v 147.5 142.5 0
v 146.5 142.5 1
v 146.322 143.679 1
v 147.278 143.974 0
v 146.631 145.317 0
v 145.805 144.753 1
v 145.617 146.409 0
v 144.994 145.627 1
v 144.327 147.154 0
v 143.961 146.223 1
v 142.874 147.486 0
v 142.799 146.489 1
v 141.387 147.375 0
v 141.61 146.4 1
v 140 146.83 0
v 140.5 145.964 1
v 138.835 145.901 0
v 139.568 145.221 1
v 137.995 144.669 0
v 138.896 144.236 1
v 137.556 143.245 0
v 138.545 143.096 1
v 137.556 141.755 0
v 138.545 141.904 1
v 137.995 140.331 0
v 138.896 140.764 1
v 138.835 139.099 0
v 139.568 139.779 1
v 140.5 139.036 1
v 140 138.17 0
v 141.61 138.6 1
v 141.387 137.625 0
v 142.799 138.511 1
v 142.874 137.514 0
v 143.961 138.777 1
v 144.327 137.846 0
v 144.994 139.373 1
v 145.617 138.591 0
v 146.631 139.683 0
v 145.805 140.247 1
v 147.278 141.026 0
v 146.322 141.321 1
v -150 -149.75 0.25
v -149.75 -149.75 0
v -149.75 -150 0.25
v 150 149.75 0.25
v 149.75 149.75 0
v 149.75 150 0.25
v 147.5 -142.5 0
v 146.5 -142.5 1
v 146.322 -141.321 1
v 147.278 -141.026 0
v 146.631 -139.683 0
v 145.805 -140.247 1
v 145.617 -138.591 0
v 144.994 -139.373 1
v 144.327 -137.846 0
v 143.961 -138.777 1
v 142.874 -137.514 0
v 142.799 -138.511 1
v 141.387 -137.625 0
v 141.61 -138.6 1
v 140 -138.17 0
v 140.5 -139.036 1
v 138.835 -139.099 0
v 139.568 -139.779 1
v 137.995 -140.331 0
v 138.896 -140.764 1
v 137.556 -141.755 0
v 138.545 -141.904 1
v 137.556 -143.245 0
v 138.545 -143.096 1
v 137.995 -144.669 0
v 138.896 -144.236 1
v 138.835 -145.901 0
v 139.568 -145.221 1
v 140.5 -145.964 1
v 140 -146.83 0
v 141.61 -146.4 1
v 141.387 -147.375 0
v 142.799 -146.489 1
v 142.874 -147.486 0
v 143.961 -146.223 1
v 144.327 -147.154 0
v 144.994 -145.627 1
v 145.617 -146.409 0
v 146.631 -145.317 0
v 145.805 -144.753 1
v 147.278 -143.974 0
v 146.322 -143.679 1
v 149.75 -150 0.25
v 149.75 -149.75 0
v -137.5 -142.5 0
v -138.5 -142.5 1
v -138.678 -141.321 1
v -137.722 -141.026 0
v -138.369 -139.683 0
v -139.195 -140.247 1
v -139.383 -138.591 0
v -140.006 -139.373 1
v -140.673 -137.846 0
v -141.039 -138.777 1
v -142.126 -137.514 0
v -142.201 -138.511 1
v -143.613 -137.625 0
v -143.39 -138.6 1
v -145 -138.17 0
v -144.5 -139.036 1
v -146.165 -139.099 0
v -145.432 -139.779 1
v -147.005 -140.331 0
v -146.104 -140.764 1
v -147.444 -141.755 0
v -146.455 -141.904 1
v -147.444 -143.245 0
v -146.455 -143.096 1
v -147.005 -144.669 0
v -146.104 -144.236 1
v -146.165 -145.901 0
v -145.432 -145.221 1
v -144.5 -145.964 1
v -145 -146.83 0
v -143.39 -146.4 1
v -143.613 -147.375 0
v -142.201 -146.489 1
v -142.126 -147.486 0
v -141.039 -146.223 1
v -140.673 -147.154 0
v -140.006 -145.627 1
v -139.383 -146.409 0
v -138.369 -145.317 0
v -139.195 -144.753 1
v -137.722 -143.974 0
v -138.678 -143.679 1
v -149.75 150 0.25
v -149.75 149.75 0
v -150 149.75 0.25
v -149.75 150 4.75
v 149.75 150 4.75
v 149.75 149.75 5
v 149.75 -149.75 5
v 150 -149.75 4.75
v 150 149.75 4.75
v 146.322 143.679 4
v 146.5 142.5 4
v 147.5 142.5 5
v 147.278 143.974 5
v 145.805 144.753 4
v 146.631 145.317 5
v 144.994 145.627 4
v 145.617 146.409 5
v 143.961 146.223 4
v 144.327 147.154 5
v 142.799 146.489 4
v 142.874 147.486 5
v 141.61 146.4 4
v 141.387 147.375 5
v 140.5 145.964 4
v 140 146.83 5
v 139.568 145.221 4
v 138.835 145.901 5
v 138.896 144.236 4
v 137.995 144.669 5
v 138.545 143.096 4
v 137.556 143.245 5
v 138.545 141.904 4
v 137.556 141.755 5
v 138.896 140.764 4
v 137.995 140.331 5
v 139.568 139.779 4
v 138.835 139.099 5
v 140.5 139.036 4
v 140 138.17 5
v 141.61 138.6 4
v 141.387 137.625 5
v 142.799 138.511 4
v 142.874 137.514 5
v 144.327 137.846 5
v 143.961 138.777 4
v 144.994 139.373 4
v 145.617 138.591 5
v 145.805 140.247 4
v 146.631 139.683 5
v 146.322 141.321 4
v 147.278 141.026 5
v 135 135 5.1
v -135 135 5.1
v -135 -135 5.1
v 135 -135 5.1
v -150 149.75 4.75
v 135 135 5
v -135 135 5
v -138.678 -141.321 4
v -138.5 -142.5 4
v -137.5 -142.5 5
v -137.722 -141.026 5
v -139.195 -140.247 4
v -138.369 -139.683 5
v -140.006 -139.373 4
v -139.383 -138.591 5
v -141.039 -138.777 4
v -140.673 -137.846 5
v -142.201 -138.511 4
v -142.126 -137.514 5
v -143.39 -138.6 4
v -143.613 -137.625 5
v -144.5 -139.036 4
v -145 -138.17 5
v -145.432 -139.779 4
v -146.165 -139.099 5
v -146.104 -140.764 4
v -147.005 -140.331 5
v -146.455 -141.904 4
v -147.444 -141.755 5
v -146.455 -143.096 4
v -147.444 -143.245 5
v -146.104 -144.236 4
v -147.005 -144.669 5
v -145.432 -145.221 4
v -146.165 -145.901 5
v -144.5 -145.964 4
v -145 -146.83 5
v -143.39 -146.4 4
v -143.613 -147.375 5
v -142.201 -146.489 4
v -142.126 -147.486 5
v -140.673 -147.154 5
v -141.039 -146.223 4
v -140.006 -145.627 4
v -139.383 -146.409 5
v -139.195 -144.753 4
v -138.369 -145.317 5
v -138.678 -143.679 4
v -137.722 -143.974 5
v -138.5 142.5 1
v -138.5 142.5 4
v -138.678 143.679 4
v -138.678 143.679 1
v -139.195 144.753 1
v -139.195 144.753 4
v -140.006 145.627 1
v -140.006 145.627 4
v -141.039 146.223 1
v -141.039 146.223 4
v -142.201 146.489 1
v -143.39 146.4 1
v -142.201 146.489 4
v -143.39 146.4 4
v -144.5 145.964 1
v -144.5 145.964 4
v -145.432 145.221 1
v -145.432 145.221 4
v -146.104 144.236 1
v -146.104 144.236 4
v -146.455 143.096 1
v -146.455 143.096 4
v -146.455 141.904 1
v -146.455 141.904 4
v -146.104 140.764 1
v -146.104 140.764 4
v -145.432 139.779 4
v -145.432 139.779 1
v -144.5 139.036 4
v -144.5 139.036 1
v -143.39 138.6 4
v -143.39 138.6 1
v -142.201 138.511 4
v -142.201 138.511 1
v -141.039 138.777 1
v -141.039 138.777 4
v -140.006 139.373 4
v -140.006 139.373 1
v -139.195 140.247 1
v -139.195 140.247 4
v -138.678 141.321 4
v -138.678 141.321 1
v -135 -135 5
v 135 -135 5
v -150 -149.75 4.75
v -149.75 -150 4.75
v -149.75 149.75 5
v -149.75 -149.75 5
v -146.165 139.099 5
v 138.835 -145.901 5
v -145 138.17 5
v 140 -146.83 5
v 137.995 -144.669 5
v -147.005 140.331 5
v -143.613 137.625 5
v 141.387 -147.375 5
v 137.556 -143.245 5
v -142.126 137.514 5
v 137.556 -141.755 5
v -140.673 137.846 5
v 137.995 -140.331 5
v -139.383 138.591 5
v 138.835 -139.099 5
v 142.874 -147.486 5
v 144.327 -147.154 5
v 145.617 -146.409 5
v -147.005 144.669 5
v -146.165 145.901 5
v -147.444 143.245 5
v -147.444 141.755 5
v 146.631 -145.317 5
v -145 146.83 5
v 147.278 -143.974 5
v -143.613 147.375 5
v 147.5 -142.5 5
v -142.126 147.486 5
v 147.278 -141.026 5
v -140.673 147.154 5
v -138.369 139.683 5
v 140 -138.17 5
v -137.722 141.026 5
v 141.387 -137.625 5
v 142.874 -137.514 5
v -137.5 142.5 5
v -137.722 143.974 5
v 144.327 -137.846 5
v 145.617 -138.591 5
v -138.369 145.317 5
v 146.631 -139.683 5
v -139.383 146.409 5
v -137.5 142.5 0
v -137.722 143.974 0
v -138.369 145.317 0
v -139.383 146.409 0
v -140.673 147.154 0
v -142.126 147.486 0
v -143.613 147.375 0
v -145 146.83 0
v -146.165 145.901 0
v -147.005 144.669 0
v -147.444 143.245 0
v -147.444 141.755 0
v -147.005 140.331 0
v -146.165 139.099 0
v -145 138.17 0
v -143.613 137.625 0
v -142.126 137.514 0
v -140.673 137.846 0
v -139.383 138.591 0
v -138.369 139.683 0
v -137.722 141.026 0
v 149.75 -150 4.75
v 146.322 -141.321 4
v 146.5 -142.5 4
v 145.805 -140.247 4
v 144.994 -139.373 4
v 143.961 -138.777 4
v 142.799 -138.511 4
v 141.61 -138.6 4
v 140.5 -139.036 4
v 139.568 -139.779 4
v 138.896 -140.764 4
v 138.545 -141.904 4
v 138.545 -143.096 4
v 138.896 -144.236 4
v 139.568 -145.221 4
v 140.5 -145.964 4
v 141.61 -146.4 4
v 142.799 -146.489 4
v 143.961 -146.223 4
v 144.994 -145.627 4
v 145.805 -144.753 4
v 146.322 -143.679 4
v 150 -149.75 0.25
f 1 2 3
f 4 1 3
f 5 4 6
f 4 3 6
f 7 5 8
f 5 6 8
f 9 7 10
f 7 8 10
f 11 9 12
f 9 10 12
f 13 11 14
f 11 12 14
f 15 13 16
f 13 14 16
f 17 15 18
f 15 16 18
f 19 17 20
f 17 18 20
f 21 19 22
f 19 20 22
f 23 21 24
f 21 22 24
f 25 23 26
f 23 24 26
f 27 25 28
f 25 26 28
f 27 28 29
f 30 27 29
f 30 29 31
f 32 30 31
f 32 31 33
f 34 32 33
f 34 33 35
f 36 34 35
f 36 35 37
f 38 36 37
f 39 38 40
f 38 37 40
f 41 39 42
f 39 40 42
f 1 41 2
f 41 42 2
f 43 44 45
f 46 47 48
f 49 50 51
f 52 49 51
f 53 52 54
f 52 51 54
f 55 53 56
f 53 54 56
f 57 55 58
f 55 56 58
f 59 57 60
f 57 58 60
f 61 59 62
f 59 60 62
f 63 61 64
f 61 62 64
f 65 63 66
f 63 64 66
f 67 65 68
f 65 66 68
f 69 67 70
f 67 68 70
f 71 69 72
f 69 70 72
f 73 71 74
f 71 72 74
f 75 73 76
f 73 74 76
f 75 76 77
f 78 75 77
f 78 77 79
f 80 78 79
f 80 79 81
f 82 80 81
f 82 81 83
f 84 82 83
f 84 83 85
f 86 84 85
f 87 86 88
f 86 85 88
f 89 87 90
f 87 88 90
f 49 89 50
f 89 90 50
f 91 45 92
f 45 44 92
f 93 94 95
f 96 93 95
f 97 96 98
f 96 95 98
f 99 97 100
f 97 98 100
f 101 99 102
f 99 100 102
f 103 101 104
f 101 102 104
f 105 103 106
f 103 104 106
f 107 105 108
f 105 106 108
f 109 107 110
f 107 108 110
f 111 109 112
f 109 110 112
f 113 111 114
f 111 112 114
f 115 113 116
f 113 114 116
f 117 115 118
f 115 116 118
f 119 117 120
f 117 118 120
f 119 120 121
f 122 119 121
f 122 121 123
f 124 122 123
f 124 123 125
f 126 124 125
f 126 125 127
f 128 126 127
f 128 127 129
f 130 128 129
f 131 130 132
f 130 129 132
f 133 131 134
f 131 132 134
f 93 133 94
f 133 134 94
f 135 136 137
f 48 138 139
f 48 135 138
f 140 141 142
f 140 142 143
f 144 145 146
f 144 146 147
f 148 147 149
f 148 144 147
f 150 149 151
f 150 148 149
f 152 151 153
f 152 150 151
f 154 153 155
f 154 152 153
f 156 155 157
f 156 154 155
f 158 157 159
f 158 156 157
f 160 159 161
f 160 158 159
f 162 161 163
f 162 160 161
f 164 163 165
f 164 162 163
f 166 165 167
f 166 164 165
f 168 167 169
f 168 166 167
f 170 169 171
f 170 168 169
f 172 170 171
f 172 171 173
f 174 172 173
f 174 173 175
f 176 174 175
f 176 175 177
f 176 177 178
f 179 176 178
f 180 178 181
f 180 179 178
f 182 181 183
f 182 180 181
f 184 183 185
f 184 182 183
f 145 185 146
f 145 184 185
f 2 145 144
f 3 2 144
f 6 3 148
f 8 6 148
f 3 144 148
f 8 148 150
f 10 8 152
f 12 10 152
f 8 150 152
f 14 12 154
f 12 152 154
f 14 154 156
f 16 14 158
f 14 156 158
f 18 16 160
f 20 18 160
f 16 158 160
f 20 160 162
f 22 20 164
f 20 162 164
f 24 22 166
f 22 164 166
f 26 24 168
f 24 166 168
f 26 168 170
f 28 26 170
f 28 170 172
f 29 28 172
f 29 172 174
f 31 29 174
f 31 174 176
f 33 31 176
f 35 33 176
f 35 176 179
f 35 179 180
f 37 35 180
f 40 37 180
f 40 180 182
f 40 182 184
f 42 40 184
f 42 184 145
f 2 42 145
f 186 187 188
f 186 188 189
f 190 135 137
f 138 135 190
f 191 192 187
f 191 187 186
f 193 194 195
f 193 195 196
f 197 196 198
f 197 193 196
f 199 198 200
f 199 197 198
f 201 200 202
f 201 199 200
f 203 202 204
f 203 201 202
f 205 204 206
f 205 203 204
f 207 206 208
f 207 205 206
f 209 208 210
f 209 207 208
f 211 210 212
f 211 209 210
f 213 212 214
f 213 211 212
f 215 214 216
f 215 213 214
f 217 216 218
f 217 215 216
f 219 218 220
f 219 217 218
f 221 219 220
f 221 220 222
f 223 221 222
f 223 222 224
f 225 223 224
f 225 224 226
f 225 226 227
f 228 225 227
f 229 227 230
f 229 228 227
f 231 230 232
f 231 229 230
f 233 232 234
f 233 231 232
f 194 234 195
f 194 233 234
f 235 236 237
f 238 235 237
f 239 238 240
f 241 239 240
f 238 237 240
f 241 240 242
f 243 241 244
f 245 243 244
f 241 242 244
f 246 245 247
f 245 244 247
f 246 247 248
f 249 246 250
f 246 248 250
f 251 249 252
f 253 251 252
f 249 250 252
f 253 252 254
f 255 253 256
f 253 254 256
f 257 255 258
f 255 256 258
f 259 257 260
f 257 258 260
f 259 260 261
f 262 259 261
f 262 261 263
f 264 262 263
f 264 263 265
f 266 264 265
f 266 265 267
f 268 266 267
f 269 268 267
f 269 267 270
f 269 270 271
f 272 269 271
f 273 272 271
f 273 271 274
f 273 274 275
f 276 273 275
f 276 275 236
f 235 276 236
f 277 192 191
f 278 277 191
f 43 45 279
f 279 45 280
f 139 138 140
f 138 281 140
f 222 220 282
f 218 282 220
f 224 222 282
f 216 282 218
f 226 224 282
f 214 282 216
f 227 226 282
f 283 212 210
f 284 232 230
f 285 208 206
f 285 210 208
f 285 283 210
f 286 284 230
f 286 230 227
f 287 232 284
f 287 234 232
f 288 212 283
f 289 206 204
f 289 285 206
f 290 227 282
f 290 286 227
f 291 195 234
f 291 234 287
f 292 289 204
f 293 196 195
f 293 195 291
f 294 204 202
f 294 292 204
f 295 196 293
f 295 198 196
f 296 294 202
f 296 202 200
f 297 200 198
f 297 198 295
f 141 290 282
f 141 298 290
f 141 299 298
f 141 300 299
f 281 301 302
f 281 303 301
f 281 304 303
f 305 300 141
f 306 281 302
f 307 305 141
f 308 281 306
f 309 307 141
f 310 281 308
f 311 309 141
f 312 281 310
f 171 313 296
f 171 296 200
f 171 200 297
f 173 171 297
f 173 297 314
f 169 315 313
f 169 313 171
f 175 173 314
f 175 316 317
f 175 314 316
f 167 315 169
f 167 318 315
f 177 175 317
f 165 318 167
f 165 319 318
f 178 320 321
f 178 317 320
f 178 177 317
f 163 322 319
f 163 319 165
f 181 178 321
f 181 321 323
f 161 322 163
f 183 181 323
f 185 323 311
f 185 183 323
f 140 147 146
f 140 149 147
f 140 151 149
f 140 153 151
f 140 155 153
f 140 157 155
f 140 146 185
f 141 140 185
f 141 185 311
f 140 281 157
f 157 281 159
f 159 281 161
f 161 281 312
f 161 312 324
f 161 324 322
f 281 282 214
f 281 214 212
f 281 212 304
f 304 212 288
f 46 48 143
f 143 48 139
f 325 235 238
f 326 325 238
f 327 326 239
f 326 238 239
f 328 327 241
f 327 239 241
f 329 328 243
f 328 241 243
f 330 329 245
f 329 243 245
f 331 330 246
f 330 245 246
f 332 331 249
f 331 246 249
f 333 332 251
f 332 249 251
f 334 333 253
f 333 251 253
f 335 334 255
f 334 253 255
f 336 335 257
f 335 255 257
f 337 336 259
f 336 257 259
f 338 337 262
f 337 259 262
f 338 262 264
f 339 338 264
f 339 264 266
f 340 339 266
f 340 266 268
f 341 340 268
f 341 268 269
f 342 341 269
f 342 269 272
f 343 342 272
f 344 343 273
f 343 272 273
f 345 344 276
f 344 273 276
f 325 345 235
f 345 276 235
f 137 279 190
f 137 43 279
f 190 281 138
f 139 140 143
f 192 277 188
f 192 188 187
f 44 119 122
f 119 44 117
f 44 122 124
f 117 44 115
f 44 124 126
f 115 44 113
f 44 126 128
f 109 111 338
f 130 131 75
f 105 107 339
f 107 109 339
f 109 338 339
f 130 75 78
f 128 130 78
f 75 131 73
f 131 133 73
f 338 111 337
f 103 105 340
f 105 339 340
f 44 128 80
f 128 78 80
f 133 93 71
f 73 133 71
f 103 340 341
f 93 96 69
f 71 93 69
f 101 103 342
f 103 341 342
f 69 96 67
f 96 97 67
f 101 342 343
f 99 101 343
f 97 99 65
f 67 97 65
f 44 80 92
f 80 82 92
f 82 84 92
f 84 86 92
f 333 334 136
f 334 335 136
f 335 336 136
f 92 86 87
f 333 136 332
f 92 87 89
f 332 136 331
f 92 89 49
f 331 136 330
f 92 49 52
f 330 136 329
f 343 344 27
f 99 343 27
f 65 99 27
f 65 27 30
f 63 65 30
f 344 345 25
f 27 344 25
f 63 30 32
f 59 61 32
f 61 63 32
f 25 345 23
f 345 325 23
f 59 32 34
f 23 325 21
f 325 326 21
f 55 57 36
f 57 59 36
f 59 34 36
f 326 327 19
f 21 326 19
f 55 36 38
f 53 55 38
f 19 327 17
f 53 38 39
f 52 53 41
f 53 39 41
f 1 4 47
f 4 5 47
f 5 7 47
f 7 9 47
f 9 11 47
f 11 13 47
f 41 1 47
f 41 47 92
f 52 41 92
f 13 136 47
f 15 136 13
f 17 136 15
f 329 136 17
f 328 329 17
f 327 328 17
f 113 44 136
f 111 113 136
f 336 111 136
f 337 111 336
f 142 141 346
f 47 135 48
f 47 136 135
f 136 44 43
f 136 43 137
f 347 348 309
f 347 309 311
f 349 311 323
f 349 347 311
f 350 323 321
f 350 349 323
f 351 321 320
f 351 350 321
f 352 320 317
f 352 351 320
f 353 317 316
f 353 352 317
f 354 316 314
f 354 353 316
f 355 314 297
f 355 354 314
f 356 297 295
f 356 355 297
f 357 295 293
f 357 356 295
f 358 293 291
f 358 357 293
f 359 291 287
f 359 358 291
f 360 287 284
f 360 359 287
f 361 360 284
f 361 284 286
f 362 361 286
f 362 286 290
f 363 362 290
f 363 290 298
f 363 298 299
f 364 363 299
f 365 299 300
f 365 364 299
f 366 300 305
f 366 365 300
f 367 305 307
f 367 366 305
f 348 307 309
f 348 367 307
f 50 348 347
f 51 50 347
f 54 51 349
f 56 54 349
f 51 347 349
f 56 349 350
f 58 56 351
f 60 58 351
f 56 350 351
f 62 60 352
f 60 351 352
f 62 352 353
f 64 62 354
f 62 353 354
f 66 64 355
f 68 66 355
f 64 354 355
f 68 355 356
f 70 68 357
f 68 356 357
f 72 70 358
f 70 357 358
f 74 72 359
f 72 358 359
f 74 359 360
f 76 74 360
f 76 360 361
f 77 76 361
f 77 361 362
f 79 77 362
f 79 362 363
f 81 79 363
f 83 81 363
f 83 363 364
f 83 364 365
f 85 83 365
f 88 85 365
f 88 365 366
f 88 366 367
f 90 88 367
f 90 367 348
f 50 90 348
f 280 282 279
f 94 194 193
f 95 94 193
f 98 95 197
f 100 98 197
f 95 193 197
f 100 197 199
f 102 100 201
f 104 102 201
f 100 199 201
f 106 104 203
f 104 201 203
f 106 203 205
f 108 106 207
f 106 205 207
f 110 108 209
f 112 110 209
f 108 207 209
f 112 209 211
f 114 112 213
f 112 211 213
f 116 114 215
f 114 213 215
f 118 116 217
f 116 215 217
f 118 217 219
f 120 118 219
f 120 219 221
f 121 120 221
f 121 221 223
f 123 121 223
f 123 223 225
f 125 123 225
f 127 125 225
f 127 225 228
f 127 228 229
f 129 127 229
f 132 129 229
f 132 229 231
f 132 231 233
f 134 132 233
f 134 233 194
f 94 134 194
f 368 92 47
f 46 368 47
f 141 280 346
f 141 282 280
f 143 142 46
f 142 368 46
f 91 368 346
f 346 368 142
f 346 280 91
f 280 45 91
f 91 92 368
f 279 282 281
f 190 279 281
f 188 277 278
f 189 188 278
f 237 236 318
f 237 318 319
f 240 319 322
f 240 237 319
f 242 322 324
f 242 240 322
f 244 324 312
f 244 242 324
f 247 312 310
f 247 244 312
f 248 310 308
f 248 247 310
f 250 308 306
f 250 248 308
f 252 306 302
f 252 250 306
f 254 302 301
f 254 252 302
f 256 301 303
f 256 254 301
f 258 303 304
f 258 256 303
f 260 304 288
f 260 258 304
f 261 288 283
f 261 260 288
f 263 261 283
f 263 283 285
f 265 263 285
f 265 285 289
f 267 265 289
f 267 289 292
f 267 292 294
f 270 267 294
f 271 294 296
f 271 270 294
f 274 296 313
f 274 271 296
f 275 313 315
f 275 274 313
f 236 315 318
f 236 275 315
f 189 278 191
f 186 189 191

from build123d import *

# Parameters (mm, degrees)
F0_W     = 300
F0_H     = 300
F1_DEPTH = 5
F2_SIZE  = 0.25
F3_W     = 270
F3_H     = 270
F4_DEPTH = 0.1
F5_R     = 4
F6_DEPTH = 25
F7_SIZE  = 1


with BuildPart() as f1:
    # F0 (on Top) → F1 (new body)
    with BuildSketch(Plane.XY):
        Rectangle(F0_W, F0_H)
    extrude(amount=F1_DEPTH)

    # F2
    f2_edges = [f1.edges().sort_by_distance(p)[0] for p in [
        (0, -150, 5),
        (150, 0, 5),
        (0, 150, 5),
        (-150, 0, 5),
        (0, -150, 0),
        (150, 0, 0),
        (0, 150, 0),
        (-150, 0, 0),
        (-150, -150, 2.5),
        (150, -150, 2.5),
        (150, 150, 2.5),
        (-150, 150, 2.5),
    ]]
    chamfer(f2_edges, length=F2_SIZE)

    # F5 (on face) → F6 (cut)
    with BuildSketch(Plane.XY.offset(5)):
        with Locations((-142.5, 142.5)):
            Circle(F5_R)
        with Locations((142.5, 142.5)):
            Circle(F5_R)
        with Locations((142.5, -142.5)):
            Circle(F5_R)
        with Locations((-142.5, -142.5)):
            Circle(F5_R)
    extrude(amount=-F6_DEPTH, mode=Mode.SUBTRACT)

    # F7
    f7_edges = [f1.edges().sort_by_distance(p)[0] for p in [
        (-146.5, 142.5, 5),
        (-138.5, 142.5, 2.5),
        (-146.5, 142.5, 0),
        (-146.5, -142.5, 5),
        (-138.5, -142.5, 2.5),
        (-146.5, -142.5, 0),
        (138.5, -142.5, 5),
        (146.5, -142.5, 2.5),
        (138.5, -142.5, 0),
        (138.5, 142.5, 5),
        (146.5, 142.5, 2.5),
        (138.5, 142.5, 0),
    ]]
    chamfer(f7_edges, length=F7_SIZE)


with BuildPart() as f4:
    # F3 (on face) → F4 (new body)
    with BuildSketch(Plane.XY.offset(5)):
        Rectangle(F3_W, F3_H)
    extrude(amount=F4_DEPTH)


solid = Compound([f1.part, f4.part])
